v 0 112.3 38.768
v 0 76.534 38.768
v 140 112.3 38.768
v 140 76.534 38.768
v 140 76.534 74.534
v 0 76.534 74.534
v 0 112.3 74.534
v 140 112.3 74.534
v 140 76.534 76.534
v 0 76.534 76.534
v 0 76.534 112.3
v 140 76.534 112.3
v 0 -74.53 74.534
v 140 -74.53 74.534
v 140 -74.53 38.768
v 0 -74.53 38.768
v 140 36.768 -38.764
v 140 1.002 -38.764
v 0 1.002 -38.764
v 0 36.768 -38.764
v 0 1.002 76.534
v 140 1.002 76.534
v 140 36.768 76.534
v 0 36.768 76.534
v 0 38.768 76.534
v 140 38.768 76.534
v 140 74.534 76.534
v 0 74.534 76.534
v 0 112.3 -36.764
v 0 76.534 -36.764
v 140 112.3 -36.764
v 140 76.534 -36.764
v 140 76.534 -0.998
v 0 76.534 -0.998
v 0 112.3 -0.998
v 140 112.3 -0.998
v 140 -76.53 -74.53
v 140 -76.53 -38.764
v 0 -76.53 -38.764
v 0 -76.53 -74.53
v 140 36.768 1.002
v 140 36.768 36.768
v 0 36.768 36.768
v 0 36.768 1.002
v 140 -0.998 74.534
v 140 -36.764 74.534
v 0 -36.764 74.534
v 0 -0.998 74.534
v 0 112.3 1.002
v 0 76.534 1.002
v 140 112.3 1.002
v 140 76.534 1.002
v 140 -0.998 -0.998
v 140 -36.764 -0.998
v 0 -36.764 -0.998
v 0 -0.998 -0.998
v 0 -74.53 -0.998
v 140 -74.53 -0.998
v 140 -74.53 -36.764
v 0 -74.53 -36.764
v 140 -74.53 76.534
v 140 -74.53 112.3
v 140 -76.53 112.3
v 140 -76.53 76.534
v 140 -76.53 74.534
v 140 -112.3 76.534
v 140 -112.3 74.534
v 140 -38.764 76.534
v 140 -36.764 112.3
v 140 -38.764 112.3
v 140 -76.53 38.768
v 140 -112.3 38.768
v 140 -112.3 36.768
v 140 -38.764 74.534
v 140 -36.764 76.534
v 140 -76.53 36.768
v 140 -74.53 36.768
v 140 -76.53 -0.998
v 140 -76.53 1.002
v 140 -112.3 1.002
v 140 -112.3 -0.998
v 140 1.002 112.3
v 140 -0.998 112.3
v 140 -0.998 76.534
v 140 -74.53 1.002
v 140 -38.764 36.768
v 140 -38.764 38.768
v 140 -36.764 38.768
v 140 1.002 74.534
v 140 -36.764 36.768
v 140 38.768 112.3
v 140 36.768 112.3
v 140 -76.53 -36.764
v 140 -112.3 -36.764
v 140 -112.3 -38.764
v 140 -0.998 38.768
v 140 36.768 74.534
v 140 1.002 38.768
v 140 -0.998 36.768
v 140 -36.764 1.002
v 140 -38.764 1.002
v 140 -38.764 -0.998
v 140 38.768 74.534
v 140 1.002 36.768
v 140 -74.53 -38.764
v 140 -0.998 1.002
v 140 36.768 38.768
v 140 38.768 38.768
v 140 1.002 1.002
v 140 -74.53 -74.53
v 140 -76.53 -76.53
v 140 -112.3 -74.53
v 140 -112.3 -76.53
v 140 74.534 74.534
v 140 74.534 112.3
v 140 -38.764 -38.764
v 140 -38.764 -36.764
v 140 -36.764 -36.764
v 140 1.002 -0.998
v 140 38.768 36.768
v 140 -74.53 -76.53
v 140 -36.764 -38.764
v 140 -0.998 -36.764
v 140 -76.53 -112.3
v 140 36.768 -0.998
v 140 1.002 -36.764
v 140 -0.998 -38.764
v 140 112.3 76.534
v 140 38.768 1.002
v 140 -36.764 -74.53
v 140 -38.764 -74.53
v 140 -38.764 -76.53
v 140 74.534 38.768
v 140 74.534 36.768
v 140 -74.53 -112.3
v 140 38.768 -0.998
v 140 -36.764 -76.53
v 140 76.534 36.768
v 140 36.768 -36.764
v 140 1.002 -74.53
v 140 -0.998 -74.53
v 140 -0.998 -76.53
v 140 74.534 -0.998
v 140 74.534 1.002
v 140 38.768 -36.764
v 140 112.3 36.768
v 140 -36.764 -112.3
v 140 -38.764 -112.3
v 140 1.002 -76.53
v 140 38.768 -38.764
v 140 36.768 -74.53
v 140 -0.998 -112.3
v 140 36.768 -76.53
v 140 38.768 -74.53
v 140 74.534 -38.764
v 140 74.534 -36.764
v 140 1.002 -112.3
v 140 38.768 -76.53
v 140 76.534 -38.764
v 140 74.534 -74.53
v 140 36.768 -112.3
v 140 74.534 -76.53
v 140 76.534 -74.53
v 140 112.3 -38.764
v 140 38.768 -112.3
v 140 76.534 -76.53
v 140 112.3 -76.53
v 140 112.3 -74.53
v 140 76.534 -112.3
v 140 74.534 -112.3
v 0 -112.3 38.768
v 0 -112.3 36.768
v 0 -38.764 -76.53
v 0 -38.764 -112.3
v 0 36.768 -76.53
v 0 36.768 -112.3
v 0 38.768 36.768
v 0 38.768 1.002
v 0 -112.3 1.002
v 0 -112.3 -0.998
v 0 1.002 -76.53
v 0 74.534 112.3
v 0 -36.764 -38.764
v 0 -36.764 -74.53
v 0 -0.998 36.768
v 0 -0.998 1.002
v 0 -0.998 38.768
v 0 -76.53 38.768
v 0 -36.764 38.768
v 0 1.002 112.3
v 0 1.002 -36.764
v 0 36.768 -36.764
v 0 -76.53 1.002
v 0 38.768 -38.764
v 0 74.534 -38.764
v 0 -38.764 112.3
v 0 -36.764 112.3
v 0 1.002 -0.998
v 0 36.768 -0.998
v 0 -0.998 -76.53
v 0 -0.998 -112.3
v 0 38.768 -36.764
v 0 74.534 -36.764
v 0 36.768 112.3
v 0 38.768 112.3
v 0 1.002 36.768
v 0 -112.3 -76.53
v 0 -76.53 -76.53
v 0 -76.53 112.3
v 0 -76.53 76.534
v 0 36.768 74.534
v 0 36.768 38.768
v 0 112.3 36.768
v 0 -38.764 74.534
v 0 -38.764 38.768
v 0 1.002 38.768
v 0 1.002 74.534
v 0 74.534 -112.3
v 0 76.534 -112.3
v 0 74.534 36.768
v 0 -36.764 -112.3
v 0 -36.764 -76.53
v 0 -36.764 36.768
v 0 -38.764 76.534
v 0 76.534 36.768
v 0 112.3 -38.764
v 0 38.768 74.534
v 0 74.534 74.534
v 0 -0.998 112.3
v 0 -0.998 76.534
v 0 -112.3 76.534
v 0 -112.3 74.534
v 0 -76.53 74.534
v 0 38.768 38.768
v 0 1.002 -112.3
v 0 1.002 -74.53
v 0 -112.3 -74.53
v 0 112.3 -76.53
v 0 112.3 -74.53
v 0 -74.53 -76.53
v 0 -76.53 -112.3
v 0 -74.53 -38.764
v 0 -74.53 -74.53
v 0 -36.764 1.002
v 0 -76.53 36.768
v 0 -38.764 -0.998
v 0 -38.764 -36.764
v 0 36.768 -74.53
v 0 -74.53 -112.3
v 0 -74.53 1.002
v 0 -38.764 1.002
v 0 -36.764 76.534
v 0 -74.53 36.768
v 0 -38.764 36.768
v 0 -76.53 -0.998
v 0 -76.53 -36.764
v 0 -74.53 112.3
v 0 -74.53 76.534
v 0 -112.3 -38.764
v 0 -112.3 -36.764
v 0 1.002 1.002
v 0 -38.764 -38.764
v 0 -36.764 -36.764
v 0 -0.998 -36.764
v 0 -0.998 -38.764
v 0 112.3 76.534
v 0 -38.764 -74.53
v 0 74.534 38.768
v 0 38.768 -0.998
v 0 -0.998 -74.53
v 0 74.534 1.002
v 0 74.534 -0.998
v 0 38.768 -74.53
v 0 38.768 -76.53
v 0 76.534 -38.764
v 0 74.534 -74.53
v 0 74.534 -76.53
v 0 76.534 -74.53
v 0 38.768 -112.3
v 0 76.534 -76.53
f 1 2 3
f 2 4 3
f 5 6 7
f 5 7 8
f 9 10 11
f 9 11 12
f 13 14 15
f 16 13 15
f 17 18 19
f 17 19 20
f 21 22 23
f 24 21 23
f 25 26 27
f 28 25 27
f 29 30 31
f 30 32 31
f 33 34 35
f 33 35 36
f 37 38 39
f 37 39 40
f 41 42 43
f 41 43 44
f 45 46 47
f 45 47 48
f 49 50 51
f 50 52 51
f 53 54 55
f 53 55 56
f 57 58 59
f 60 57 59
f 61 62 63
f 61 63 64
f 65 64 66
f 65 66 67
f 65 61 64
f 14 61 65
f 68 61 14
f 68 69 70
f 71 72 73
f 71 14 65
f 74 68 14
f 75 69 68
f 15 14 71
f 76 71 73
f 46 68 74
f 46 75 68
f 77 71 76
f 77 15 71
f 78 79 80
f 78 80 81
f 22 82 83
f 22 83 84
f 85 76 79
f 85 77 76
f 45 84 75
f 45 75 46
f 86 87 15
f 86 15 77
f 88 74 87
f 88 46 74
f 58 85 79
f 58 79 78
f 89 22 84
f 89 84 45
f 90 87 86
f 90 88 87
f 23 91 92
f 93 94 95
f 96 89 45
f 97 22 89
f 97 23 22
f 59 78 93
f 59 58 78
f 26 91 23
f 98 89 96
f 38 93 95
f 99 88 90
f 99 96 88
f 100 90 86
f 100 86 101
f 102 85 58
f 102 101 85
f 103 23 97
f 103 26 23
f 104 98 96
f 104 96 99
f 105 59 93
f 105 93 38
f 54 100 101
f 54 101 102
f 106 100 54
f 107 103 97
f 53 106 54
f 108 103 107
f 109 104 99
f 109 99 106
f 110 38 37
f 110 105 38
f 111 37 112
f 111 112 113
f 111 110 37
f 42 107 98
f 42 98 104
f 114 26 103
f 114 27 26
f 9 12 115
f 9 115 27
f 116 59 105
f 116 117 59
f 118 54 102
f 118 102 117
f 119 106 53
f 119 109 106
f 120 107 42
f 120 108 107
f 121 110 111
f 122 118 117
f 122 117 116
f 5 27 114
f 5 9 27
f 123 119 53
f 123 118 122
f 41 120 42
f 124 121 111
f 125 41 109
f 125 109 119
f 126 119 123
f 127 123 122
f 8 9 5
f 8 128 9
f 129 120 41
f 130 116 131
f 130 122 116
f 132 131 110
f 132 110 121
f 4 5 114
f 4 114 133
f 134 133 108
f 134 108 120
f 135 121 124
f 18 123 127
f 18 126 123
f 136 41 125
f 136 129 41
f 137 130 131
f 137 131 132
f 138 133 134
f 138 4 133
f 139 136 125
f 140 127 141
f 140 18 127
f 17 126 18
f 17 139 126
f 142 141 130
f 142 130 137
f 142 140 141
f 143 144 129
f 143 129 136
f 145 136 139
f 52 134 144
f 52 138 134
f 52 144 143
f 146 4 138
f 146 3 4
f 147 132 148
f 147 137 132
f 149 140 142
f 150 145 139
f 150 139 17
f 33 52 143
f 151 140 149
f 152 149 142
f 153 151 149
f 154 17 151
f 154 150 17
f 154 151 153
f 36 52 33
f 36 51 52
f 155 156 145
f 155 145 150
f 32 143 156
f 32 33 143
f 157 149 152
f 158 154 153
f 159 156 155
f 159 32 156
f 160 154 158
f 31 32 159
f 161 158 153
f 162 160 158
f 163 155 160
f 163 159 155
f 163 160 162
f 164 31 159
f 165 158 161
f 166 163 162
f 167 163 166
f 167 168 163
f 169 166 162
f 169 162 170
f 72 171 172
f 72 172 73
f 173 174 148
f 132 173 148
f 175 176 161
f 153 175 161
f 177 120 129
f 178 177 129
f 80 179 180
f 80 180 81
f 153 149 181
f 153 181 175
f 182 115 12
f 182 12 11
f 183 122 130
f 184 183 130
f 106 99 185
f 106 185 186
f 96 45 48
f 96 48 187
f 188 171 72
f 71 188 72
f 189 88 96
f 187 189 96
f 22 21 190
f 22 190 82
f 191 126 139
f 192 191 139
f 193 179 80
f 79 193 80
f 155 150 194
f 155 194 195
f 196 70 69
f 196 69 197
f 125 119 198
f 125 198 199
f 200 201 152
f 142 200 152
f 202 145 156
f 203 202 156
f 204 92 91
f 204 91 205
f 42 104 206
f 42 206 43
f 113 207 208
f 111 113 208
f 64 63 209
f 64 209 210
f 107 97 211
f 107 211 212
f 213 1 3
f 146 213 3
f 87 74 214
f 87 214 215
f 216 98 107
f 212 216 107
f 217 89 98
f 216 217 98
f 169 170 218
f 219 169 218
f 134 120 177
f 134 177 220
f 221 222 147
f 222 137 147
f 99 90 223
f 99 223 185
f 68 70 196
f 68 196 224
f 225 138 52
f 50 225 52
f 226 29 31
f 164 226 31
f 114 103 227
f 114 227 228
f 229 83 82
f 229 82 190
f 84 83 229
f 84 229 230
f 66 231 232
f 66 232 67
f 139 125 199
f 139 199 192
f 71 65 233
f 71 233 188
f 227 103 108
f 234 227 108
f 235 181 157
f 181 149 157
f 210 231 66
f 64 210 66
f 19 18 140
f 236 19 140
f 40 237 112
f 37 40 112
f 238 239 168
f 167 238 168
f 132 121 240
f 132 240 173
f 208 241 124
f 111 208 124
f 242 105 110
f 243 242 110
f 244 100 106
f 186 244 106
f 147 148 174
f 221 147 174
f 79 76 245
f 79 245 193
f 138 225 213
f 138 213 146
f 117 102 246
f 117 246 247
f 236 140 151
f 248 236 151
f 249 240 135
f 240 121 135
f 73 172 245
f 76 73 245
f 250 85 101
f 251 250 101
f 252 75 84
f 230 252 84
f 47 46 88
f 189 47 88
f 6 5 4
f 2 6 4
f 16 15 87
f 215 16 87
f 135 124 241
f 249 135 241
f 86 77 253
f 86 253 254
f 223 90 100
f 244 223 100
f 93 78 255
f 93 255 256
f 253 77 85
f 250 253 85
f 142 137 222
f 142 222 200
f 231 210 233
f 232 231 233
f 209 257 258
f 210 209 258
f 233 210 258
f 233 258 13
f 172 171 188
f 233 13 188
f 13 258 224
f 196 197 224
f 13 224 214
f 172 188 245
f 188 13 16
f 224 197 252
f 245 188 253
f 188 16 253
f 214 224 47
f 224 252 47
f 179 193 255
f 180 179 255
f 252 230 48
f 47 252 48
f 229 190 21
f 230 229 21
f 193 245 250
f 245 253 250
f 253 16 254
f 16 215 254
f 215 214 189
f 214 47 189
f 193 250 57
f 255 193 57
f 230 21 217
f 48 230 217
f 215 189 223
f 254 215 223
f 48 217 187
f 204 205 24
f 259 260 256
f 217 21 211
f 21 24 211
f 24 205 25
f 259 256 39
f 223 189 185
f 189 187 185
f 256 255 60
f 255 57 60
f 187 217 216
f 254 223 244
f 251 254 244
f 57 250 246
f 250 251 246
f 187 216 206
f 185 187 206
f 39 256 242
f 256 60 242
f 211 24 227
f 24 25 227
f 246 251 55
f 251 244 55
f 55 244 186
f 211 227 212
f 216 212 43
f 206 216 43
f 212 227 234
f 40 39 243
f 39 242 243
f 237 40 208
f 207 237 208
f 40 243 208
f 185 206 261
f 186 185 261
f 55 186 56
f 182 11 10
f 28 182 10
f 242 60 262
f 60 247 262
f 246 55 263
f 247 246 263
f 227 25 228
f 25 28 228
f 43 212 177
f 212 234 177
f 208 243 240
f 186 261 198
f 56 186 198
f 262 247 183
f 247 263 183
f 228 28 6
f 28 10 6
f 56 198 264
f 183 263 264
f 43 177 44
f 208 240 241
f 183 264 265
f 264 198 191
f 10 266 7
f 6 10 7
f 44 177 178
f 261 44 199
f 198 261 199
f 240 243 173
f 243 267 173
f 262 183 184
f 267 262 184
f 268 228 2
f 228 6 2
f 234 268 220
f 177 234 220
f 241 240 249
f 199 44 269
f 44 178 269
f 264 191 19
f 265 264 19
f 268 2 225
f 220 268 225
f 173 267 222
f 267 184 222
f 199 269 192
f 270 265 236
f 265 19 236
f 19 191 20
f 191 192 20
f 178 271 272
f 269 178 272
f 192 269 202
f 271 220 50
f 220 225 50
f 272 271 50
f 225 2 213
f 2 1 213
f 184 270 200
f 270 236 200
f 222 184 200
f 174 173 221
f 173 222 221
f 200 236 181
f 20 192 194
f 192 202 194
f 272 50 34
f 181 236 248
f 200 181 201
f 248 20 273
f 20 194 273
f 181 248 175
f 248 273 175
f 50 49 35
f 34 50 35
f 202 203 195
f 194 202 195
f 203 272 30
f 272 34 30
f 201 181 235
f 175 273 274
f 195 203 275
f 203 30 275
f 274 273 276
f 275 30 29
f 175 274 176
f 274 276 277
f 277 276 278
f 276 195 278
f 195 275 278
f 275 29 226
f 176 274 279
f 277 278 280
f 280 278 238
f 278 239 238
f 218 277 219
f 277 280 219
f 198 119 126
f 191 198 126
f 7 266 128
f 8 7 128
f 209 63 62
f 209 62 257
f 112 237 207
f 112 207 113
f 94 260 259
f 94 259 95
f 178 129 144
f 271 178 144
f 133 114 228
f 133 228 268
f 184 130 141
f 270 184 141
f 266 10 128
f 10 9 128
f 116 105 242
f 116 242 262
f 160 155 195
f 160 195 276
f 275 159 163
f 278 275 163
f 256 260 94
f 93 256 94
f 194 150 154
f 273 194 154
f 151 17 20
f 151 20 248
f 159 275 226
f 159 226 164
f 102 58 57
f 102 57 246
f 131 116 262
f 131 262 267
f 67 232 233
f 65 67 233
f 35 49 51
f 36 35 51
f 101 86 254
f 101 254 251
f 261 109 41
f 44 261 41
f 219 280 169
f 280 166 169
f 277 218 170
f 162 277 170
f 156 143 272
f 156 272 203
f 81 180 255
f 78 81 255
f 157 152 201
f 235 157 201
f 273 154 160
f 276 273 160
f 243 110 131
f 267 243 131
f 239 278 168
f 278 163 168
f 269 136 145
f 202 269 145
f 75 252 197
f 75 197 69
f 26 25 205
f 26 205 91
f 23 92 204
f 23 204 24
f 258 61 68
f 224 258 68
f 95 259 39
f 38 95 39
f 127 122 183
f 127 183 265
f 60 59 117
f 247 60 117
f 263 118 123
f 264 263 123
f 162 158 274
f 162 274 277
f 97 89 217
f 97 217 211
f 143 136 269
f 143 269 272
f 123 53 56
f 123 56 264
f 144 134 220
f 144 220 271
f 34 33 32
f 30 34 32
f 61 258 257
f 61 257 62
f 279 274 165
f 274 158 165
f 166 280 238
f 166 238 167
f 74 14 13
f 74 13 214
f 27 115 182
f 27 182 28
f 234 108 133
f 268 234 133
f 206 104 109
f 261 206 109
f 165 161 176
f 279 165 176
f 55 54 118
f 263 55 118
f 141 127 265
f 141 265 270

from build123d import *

# Parameters (mm, degrees)
SKETCH1_W               = 228.6
SKETCH1_H               = 228.6
BOSS_EXTRUDE1_DEPTH     = 140
SKETCH2_W               = 35.766
SKETCH2_H               = 35.766
CUT_EXTRUDE1_DEPTH      = 76.2
CUT_EXTRUDE3_DEPTH      = 4
CUT_EXTRUDE3_DEPTH_BACK = 4
SKETCH4_W               = 140
SKETCH4_H               = 35.766
CUT_EXTRUDE4_DEPTH      = 4
CUT_EXTRUDE4_DEPTH_BACK = 4
SKETCH5_W               = 140
SKETCH5_H               = 37.77
SKETCH5_H_2             = 35.766
CUT_EXTRUDE5_DEPTH      = 4
CUT_EXTRUDE5_DEPTH_BACK = 4
SKETCH6_W               = 140
SKETCH6_H               = 35.766
SKETCH6_H_2             = 37.77
CUT_EXTRUDE6_DEPTH      = 4
CUT_EXTRUDE6_DEPTH_BACK = 4
SKETCH9_W               = 140
SKETCH9_H               = 37.766
SKETCH9_H_2             = 35.766
SKETCH9_H_3             = 37.77
SKETCH10_W              = 140
SKETCH10_H              = 2
CUT_EXTRUDE7_DEPTH      = 263.834749521
SKETCH11_W              = 140
SKETCH11_H              = 2
CUT_EXTRUDE8_DEPTH      = 262.383356203
SKETCH12_W              = 33.77
SKETCH12_H              = 33.766
SKETCH12_W_2            = 35.766
SKETCH12_W_3            = 33.766
SKETCH12_H_2            = 35.766
SKETCH12_H_3            = 33.77
CUT_EXTRUDE9_DEPTH      = 177.150560601
SKETCH13_W              = 33.77
SKETCH13_H              = 35.766
SKETCH13_W_2            = 35.766
CUT_EXTRUDE10_DEPTH     = 177.150560601
SKETCH14_W              = 35.766
SKETCH14_H              = 35.766
CUT_EXTRUDE11_DEPTH     = 177.150560601


with BuildPart() as part:
    # Sketch1 → Boss-Extrude1 (new body)
    with BuildSketch(Plane(origin=(0, 0, 0), x_dir=(0, 0, -1), z_dir=(1, 0, 0))):
        Rectangle(SKETCH1_W, SKETCH1_H)
    extrude(amount=BOSS_EXTRUDE1_DEPTH)

    # Sketch2 → Cut-Extrude1 (cut)
    with BuildSketch(Plane(origin=(140, 0, 0), x_dir=(0, 0, -1), z_dir=(1, 0, 0))):
        with Locations((-94.417, 94.417)):
            Rectangle(SKETCH2_W, SKETCH2_H)
        with Locations((-56.651, 94.417)):
            Rectangle(SKETCH2_W, SKETCH2_H)
        with Locations((18.881, 94.417)):
            Rectangle(SKETCH2_W, SKETCH2_H)
        with Locations((-18.885, 94.417)):
            Rectangle(SKETCH2_W, SKETCH2_H)
        with Locations((56.647, 94.417)):
            Rectangle(SKETCH2_W, SKETCH2_H)
        with Locations((94.413, 94.417)):
            Rectangle(SKETCH2_W, SKETCH2_H)
        with Locations((56.647, 56.651)):
            Rectangle(SKETCH2_W, SKETCH2_H)
        with Locations((94.413, 56.651)):
            Rectangle(SKETCH2_W, SKETCH2_H)
        with Locations((18.881, 56.651)):
            Rectangle(SKETCH2_W, SKETCH2_H)
        with Locations((-18.885, 56.651)):
            Rectangle(SKETCH2_W, SKETCH2_H)
        with Locations((-56.651, 56.651)):
            Rectangle(SKETCH2_W, SKETCH2_H)
        with Locations((-94.417, 56.651)):
            Rectangle(SKETCH2_W, SKETCH2_H)
        with Locations((-94.417, 18.885)):
            Rectangle(SKETCH2_W, SKETCH2_H)
        with Locations((-56.651, 18.885)):
            Rectangle(SKETCH2_W, SKETCH2_H)
        with Locations((-18.885, 18.885)):
            Rectangle(SKETCH2_W, SKETCH2_H)
        with Locations((18.881, 18.885)):
            Rectangle(SKETCH2_W, SKETCH2_H)
        with Locations((56.647, 18.885)):
            Rectangle(SKETCH2_W, SKETCH2_H)
        with Locations((94.413, 18.885)):
            Rectangle(SKETCH2_W, SKETCH2_H)
        with Locations((94.413, -18.881)):
            Rectangle(SKETCH2_W, SKETCH2_H)
        with Locations((56.647, -18.881)):
            Rectangle(SKETCH2_W, SKETCH2_H)
        with Locations((18.881, -18.881)):
            Rectangle(SKETCH2_W, SKETCH2_H)
        with Locations((-18.885, -18.881)):
            Rectangle(SKETCH2_W, SKETCH2_H)
        with Locations((-56.651, -18.881)):
            Rectangle(SKETCH2_W, SKETCH2_H)
        with Locations((-94.417, -18.881)):
            Rectangle(SKETCH2_W, SKETCH2_H)
        with Locations((56.647, -56.647)):
            Rectangle(SKETCH2_W, SKETCH2_H)
        with Locations((94.413, -56.647)):
            Rectangle(SKETCH2_W, SKETCH2_H)
        with Locations((94.413, -94.413)):
            Rectangle(SKETCH2_W, SKETCH2_H)
        with Locations((56.647, -94.413)):
            Rectangle(SKETCH2_W, SKETCH2_H)
        with Locations((18.881, -94.413)):
            Rectangle(SKETCH2_W, SKETCH2_H)
        with Locations((18.881, -56.647)):
            Rectangle(SKETCH2_W, SKETCH2_H)
        with Locations((-18.885, -56.647)):
            Rectangle(SKETCH2_W, SKETCH2_H)
        with Locations((-18.885, -94.413)):
            Rectangle(SKETCH2_W, SKETCH2_H)
        with Locations((-56.651, -94.413)):
            Rectangle(SKETCH2_W, SKETCH2_H)
        with Locations((-56.651, -56.647)):
            Rectangle(SKETCH2_W, SKETCH2_H)
        with Locations((-94.417, -94.413)):
            Rectangle(SKETCH2_W, SKETCH2_H)
        with Locations((-94.417, -56.647)):
            Rectangle(SKETCH2_W, SKETCH2_H)
    extrude(amount=-CUT_EXTRUDE1_DEPTH, mode=Mode.SUBTRACT)

    # Sketch4 → Cut-Extrude3 (cut, two sides: drawn at the far end of the back side and taken through both)
    with BuildSketch(Plane(origin=(0, -114.3, 0), x_dir=(1, 0, 0), z_dir=(0, 1, 0)).offset(-CUT_EXTRUDE3_DEPTH_BACK)):
        with Locations((70, -94.417)):
            Rectangle(SKETCH4_W, SKETCH4_H)
        with Locations((70, -56.651)):
            Rectangle(SKETCH4_W, SKETCH4_H)
        with Locations((70, -18.885)):
            Rectangle(SKETCH4_W, SKETCH4_H)
        with Locations((70, 18.881)):
            Rectangle(SKETCH4_W, SKETCH4_H)
        with Locations((70, 56.647)):
            Rectangle(SKETCH4_W, SKETCH4_H)
        with Locations((70, 94.413)):
            Rectangle(SKETCH4_W, SKETCH4_H)
    extrude(amount=CUT_EXTRUDE3_DEPTH + CUT_EXTRUDE3_DEPTH_BACK, mode=Mode.SUBTRACT)

    # Sketch5 → Cut-Extrude4 (cut, two sides: drawn at the far end of the back side and taken through both)
    with BuildSketch(Plane.XY.offset(114.3).offset(-CUT_EXTRUDE4_DEPTH_BACK)):
        with Locations((70, -95.415)):
            Rectangle(SKETCH5_W, SKETCH5_H)
        with Locations((70, -56.647)):
            Rectangle(SKETCH5_W, SKETCH5_H_2)
        with Locations((70, -18.881)):
            Rectangle(SKETCH5_W, SKETCH5_H_2)
        with Locations((70, 18.885)):
            Rectangle(SKETCH5_W, SKETCH5_H_2)
        with Locations((70, 56.651)):
            Rectangle(SKETCH5_W, SKETCH5_H_2)
        with Locations((70, 94.417)):
            Rectangle(SKETCH5_W, SKETCH5_H_2)
    extrude(amount=CUT_EXTRUDE4_DEPTH + CUT_EXTRUDE4_DEPTH_BACK, mode=Mode.SUBTRACT)

    # Sketch6 → Cut-Extrude5 (cut, two sides: drawn at the far end of the back side and taken through both)
    with BuildSketch(Plane.XY.offset(-114.3).offset(-CUT_EXTRUDE5_DEPTH_BACK)):
        with Locations((70, 94.417)):
            Rectangle(SKETCH6_W, SKETCH6_H)
        with Locations((70, 56.651)):
            Rectangle(SKETCH6_W, SKETCH6_H)
        with Locations((70, 18.885)):
            Rectangle(SKETCH6_W, SKETCH6_H)
        with Locations((70, -18.881)):
            Rectangle(SKETCH6_W, SKETCH6_H)
        with Locations((70, -56.647)):
            Rectangle(SKETCH6_W, SKETCH6_H)
        with Locations((70, -95.415)):
            Rectangle(SKETCH6_W, SKETCH6_H_2)
    extrude(amount=CUT_EXTRUDE5_DEPTH + CUT_EXTRUDE5_DEPTH_BACK, mode=Mode.SUBTRACT)

    # Sketch9 → Cut-Extrude6 (cut, two sides: drawn at the far end of the back side and taken through both)
    with BuildSketch(Plane(origin=(0, 114.3, 0), x_dir=(1, 0, 0), z_dir=(0, 1, 0)).offset(-CUT_EXTRUDE6_DEPTH_BACK)):
        with Locations((70, -95.417)):
            Rectangle(SKETCH9_W, SKETCH9_H)
        with Locations((70, -56.651)):
            Rectangle(SKETCH9_W, SKETCH9_H_2)
        with Locations((70, -18.885)):
            Rectangle(SKETCH9_W, SKETCH9_H_2)
        with Locations((70, 18.881)):
            Rectangle(SKETCH9_W, SKETCH9_H_2)
        with Locations((70, 56.647)):
            Rectangle(SKETCH9_W, SKETCH9_H_2)
        with Locations((70, 95.415)):
            Rectangle(SKETCH9_W, SKETCH9_H_3)
    extrude(amount=CUT_EXTRUDE6_DEPTH + CUT_EXTRUDE6_DEPTH_BACK, mode=Mode.SUBTRACT)

    # Sketch10 → Cut-Extrude7 (cut, through all)
    with BuildSketch(Plane.XY.offset(76.534)):
        with Locations((70, -113.3)):
            Rectangle(SKETCH10_W, SKETCH10_H)
        with Locations((70, 113.3)):
            Rectangle(SKETCH10_W, SKETCH10_H)
    extrude(amount=-CUT_EXTRUDE7_DEPTH, mode=Mode.SUBTRACT)

    # Sketch11 → Cut-Extrude8 (cut, through all)
    with BuildSketch(Plane(origin=(0, -76.53, 0), x_dir=(-1, 0, 0), z_dir=(0, -1, 0))):
        with Locations((-70, 113.3)):
            Rectangle(SKETCH11_W, SKETCH11_H)
        with Locations((-70, -113.3)):
            Rectangle(SKETCH11_W, SKETCH11_H)
    extrude(amount=-CUT_EXTRUDE8_DEPTH, mode=Mode.SUBTRACT)

    # Sketch12 → Cut-Extrude9 (cut, through all)
    with BuildSketch(Plane(origin=(63.8, 0, 0), x_dir=(0, 0, -1), z_dir=(1, 0, 0))):
        with Locations((93.415, 93.417)):
            Rectangle(SKETCH12_W, SKETCH12_H)
        with Locations((56.647, 93.417)):
            Rectangle(SKETCH12_W_2, SKETCH12_H)
        with Locations((-18.885, 93.417)):
            Rectangle(SKETCH12_W_2, SKETCH12_H)
        with Locations((18.881, 93.417)):
            Rectangle(SKETCH12_W_2, SKETCH12_H)
        with Locations((-56.651, 93.417)):
            Rectangle(SKETCH12_W_2, SKETCH12_H)
        with Locations((-93.417, 93.417)):
            Rectangle(SKETCH12_W_3, SKETCH12_H)
        with Locations((-93.417, 56.651)):
            Rectangle(SKETCH12_W_3, SKETCH12_H_2)
        with Locations((-93.417, 18.885)):
            Rectangle(SKETCH12_W_3, SKETCH12_H_2)
        with Locations((-93.417, -18.881)):
            Rectangle(SKETCH12_W_3, SKETCH12_H_2)
        with Locations((-93.417, -56.647)):
            Rectangle(SKETCH12_W_3, SKETCH12_H_2)
        with Locations((-93.417, -93.415)):
            Rectangle(SKETCH12_W_3, SKETCH12_H_3)
        with Locations((-56.651, -93.415)):
            Rectangle(SKETCH12_W_2, SKETCH12_H_3)
        with Locations((-18.885, -93.415)):
            Rectangle(SKETCH12_W_2, SKETCH12_H_3)
        with Locations((18.881, -93.415)):
            Rectangle(SKETCH12_W_2, SKETCH12_H_3)
        with Locations((56.647, -93.415)):
            Rectangle(SKETCH12_W_2, SKETCH12_H_3)
        with Locations((93.415, -93.415)):
            Rectangle(SKETCH12_W, SKETCH12_H_3)
        with Locations((93.415, -56.647)):
            Rectangle(SKETCH12_W, SKETCH12_H_2)
        with Locations((93.415, -18.881)):
            Rectangle(SKETCH12_W, SKETCH12_H_2)
    extrude(amount=-CUT_EXTRUDE9_DEPTH, mode=Mode.SUBTRACT)

    # Sketch13 → Cut-Extrude10 (cut, through all)
    with BuildSketch(Plane(origin=(63.8, 0, 0), x_dir=(0, 0, -1), z_dir=(1, 0, 0))):
        with Locations((93.415, 18.885)):
            Rectangle(SKETCH13_W, SKETCH13_H)
        with Locations((93.415, 56.651)):
            Rectangle(SKETCH13_W, SKETCH13_H)
        with Locations((56.647, 56.651)):
            Rectangle(SKETCH13_W_2, SKETCH13_H)
        with Locations((18.881, 56.651)):
            Rectangle(SKETCH13_W_2, SKETCH13_H)
        with Locations((18.881, 18.885)):
            Rectangle(SKETCH13_W_2, SKETCH13_H)
        with Locations((56.647, 18.885)):
            Rectangle(SKETCH13_W_2, SKETCH13_H)
        with Locations((-18.885, 18.885)):
            Rectangle(SKETCH13_W_2, SKETCH13_H)
        with Locations((-56.651, 18.885)):
            Rectangle(SKETCH13_W_2, SKETCH13_H)
        with Locations((-56.651, -18.881)):
            Rectangle(SKETCH13_W_2, SKETCH13_H)
        with Locations((-56.651, -56.647)):
            Rectangle(SKETCH13_W_2, SKETCH13_H)
        with Locations((18.881, -56.647)):
            Rectangle(SKETCH13_W_2, SKETCH13_H)
        with Locations((-18.885, -56.647)):
            Rectangle(SKETCH13_W_2, SKETCH13_H)
        with Locations((56.647, -56.647)):
            Rectangle(SKETCH13_W_2, SKETCH13_H)
        with Locations((56.647, -18.881)):
            Rectangle(SKETCH13_W_2, SKETCH13_H)
    extrude(amount=-CUT_EXTRUDE10_DEPTH, mode=Mode.SUBTRACT)

    # Sketch14 → Cut-Extrude11 (cut, through all)
    with BuildSketch(Plane(origin=(63.8, 0, 0), x_dir=(0, 0, -1), z_dir=(1, 0, 0))):
        with Locations((18.881, -18.881)):
            Rectangle(SKETCH14_W, SKETCH14_H)
        with Locations((-18.885, -18.881)):
            Rectangle(SKETCH14_W, SKETCH14_H)
        with Locations((-18.885, 56.651)):
            Rectangle(SKETCH14_W, SKETCH14_H)
        with Locations((-56.651, 56.651)):
            Rectangle(SKETCH14_W, SKETCH14_H)
    extrude(amount=-CUT_EXTRUDE11_DEPTH, mode=Mode.SUBTRACT)


solid = part.part
